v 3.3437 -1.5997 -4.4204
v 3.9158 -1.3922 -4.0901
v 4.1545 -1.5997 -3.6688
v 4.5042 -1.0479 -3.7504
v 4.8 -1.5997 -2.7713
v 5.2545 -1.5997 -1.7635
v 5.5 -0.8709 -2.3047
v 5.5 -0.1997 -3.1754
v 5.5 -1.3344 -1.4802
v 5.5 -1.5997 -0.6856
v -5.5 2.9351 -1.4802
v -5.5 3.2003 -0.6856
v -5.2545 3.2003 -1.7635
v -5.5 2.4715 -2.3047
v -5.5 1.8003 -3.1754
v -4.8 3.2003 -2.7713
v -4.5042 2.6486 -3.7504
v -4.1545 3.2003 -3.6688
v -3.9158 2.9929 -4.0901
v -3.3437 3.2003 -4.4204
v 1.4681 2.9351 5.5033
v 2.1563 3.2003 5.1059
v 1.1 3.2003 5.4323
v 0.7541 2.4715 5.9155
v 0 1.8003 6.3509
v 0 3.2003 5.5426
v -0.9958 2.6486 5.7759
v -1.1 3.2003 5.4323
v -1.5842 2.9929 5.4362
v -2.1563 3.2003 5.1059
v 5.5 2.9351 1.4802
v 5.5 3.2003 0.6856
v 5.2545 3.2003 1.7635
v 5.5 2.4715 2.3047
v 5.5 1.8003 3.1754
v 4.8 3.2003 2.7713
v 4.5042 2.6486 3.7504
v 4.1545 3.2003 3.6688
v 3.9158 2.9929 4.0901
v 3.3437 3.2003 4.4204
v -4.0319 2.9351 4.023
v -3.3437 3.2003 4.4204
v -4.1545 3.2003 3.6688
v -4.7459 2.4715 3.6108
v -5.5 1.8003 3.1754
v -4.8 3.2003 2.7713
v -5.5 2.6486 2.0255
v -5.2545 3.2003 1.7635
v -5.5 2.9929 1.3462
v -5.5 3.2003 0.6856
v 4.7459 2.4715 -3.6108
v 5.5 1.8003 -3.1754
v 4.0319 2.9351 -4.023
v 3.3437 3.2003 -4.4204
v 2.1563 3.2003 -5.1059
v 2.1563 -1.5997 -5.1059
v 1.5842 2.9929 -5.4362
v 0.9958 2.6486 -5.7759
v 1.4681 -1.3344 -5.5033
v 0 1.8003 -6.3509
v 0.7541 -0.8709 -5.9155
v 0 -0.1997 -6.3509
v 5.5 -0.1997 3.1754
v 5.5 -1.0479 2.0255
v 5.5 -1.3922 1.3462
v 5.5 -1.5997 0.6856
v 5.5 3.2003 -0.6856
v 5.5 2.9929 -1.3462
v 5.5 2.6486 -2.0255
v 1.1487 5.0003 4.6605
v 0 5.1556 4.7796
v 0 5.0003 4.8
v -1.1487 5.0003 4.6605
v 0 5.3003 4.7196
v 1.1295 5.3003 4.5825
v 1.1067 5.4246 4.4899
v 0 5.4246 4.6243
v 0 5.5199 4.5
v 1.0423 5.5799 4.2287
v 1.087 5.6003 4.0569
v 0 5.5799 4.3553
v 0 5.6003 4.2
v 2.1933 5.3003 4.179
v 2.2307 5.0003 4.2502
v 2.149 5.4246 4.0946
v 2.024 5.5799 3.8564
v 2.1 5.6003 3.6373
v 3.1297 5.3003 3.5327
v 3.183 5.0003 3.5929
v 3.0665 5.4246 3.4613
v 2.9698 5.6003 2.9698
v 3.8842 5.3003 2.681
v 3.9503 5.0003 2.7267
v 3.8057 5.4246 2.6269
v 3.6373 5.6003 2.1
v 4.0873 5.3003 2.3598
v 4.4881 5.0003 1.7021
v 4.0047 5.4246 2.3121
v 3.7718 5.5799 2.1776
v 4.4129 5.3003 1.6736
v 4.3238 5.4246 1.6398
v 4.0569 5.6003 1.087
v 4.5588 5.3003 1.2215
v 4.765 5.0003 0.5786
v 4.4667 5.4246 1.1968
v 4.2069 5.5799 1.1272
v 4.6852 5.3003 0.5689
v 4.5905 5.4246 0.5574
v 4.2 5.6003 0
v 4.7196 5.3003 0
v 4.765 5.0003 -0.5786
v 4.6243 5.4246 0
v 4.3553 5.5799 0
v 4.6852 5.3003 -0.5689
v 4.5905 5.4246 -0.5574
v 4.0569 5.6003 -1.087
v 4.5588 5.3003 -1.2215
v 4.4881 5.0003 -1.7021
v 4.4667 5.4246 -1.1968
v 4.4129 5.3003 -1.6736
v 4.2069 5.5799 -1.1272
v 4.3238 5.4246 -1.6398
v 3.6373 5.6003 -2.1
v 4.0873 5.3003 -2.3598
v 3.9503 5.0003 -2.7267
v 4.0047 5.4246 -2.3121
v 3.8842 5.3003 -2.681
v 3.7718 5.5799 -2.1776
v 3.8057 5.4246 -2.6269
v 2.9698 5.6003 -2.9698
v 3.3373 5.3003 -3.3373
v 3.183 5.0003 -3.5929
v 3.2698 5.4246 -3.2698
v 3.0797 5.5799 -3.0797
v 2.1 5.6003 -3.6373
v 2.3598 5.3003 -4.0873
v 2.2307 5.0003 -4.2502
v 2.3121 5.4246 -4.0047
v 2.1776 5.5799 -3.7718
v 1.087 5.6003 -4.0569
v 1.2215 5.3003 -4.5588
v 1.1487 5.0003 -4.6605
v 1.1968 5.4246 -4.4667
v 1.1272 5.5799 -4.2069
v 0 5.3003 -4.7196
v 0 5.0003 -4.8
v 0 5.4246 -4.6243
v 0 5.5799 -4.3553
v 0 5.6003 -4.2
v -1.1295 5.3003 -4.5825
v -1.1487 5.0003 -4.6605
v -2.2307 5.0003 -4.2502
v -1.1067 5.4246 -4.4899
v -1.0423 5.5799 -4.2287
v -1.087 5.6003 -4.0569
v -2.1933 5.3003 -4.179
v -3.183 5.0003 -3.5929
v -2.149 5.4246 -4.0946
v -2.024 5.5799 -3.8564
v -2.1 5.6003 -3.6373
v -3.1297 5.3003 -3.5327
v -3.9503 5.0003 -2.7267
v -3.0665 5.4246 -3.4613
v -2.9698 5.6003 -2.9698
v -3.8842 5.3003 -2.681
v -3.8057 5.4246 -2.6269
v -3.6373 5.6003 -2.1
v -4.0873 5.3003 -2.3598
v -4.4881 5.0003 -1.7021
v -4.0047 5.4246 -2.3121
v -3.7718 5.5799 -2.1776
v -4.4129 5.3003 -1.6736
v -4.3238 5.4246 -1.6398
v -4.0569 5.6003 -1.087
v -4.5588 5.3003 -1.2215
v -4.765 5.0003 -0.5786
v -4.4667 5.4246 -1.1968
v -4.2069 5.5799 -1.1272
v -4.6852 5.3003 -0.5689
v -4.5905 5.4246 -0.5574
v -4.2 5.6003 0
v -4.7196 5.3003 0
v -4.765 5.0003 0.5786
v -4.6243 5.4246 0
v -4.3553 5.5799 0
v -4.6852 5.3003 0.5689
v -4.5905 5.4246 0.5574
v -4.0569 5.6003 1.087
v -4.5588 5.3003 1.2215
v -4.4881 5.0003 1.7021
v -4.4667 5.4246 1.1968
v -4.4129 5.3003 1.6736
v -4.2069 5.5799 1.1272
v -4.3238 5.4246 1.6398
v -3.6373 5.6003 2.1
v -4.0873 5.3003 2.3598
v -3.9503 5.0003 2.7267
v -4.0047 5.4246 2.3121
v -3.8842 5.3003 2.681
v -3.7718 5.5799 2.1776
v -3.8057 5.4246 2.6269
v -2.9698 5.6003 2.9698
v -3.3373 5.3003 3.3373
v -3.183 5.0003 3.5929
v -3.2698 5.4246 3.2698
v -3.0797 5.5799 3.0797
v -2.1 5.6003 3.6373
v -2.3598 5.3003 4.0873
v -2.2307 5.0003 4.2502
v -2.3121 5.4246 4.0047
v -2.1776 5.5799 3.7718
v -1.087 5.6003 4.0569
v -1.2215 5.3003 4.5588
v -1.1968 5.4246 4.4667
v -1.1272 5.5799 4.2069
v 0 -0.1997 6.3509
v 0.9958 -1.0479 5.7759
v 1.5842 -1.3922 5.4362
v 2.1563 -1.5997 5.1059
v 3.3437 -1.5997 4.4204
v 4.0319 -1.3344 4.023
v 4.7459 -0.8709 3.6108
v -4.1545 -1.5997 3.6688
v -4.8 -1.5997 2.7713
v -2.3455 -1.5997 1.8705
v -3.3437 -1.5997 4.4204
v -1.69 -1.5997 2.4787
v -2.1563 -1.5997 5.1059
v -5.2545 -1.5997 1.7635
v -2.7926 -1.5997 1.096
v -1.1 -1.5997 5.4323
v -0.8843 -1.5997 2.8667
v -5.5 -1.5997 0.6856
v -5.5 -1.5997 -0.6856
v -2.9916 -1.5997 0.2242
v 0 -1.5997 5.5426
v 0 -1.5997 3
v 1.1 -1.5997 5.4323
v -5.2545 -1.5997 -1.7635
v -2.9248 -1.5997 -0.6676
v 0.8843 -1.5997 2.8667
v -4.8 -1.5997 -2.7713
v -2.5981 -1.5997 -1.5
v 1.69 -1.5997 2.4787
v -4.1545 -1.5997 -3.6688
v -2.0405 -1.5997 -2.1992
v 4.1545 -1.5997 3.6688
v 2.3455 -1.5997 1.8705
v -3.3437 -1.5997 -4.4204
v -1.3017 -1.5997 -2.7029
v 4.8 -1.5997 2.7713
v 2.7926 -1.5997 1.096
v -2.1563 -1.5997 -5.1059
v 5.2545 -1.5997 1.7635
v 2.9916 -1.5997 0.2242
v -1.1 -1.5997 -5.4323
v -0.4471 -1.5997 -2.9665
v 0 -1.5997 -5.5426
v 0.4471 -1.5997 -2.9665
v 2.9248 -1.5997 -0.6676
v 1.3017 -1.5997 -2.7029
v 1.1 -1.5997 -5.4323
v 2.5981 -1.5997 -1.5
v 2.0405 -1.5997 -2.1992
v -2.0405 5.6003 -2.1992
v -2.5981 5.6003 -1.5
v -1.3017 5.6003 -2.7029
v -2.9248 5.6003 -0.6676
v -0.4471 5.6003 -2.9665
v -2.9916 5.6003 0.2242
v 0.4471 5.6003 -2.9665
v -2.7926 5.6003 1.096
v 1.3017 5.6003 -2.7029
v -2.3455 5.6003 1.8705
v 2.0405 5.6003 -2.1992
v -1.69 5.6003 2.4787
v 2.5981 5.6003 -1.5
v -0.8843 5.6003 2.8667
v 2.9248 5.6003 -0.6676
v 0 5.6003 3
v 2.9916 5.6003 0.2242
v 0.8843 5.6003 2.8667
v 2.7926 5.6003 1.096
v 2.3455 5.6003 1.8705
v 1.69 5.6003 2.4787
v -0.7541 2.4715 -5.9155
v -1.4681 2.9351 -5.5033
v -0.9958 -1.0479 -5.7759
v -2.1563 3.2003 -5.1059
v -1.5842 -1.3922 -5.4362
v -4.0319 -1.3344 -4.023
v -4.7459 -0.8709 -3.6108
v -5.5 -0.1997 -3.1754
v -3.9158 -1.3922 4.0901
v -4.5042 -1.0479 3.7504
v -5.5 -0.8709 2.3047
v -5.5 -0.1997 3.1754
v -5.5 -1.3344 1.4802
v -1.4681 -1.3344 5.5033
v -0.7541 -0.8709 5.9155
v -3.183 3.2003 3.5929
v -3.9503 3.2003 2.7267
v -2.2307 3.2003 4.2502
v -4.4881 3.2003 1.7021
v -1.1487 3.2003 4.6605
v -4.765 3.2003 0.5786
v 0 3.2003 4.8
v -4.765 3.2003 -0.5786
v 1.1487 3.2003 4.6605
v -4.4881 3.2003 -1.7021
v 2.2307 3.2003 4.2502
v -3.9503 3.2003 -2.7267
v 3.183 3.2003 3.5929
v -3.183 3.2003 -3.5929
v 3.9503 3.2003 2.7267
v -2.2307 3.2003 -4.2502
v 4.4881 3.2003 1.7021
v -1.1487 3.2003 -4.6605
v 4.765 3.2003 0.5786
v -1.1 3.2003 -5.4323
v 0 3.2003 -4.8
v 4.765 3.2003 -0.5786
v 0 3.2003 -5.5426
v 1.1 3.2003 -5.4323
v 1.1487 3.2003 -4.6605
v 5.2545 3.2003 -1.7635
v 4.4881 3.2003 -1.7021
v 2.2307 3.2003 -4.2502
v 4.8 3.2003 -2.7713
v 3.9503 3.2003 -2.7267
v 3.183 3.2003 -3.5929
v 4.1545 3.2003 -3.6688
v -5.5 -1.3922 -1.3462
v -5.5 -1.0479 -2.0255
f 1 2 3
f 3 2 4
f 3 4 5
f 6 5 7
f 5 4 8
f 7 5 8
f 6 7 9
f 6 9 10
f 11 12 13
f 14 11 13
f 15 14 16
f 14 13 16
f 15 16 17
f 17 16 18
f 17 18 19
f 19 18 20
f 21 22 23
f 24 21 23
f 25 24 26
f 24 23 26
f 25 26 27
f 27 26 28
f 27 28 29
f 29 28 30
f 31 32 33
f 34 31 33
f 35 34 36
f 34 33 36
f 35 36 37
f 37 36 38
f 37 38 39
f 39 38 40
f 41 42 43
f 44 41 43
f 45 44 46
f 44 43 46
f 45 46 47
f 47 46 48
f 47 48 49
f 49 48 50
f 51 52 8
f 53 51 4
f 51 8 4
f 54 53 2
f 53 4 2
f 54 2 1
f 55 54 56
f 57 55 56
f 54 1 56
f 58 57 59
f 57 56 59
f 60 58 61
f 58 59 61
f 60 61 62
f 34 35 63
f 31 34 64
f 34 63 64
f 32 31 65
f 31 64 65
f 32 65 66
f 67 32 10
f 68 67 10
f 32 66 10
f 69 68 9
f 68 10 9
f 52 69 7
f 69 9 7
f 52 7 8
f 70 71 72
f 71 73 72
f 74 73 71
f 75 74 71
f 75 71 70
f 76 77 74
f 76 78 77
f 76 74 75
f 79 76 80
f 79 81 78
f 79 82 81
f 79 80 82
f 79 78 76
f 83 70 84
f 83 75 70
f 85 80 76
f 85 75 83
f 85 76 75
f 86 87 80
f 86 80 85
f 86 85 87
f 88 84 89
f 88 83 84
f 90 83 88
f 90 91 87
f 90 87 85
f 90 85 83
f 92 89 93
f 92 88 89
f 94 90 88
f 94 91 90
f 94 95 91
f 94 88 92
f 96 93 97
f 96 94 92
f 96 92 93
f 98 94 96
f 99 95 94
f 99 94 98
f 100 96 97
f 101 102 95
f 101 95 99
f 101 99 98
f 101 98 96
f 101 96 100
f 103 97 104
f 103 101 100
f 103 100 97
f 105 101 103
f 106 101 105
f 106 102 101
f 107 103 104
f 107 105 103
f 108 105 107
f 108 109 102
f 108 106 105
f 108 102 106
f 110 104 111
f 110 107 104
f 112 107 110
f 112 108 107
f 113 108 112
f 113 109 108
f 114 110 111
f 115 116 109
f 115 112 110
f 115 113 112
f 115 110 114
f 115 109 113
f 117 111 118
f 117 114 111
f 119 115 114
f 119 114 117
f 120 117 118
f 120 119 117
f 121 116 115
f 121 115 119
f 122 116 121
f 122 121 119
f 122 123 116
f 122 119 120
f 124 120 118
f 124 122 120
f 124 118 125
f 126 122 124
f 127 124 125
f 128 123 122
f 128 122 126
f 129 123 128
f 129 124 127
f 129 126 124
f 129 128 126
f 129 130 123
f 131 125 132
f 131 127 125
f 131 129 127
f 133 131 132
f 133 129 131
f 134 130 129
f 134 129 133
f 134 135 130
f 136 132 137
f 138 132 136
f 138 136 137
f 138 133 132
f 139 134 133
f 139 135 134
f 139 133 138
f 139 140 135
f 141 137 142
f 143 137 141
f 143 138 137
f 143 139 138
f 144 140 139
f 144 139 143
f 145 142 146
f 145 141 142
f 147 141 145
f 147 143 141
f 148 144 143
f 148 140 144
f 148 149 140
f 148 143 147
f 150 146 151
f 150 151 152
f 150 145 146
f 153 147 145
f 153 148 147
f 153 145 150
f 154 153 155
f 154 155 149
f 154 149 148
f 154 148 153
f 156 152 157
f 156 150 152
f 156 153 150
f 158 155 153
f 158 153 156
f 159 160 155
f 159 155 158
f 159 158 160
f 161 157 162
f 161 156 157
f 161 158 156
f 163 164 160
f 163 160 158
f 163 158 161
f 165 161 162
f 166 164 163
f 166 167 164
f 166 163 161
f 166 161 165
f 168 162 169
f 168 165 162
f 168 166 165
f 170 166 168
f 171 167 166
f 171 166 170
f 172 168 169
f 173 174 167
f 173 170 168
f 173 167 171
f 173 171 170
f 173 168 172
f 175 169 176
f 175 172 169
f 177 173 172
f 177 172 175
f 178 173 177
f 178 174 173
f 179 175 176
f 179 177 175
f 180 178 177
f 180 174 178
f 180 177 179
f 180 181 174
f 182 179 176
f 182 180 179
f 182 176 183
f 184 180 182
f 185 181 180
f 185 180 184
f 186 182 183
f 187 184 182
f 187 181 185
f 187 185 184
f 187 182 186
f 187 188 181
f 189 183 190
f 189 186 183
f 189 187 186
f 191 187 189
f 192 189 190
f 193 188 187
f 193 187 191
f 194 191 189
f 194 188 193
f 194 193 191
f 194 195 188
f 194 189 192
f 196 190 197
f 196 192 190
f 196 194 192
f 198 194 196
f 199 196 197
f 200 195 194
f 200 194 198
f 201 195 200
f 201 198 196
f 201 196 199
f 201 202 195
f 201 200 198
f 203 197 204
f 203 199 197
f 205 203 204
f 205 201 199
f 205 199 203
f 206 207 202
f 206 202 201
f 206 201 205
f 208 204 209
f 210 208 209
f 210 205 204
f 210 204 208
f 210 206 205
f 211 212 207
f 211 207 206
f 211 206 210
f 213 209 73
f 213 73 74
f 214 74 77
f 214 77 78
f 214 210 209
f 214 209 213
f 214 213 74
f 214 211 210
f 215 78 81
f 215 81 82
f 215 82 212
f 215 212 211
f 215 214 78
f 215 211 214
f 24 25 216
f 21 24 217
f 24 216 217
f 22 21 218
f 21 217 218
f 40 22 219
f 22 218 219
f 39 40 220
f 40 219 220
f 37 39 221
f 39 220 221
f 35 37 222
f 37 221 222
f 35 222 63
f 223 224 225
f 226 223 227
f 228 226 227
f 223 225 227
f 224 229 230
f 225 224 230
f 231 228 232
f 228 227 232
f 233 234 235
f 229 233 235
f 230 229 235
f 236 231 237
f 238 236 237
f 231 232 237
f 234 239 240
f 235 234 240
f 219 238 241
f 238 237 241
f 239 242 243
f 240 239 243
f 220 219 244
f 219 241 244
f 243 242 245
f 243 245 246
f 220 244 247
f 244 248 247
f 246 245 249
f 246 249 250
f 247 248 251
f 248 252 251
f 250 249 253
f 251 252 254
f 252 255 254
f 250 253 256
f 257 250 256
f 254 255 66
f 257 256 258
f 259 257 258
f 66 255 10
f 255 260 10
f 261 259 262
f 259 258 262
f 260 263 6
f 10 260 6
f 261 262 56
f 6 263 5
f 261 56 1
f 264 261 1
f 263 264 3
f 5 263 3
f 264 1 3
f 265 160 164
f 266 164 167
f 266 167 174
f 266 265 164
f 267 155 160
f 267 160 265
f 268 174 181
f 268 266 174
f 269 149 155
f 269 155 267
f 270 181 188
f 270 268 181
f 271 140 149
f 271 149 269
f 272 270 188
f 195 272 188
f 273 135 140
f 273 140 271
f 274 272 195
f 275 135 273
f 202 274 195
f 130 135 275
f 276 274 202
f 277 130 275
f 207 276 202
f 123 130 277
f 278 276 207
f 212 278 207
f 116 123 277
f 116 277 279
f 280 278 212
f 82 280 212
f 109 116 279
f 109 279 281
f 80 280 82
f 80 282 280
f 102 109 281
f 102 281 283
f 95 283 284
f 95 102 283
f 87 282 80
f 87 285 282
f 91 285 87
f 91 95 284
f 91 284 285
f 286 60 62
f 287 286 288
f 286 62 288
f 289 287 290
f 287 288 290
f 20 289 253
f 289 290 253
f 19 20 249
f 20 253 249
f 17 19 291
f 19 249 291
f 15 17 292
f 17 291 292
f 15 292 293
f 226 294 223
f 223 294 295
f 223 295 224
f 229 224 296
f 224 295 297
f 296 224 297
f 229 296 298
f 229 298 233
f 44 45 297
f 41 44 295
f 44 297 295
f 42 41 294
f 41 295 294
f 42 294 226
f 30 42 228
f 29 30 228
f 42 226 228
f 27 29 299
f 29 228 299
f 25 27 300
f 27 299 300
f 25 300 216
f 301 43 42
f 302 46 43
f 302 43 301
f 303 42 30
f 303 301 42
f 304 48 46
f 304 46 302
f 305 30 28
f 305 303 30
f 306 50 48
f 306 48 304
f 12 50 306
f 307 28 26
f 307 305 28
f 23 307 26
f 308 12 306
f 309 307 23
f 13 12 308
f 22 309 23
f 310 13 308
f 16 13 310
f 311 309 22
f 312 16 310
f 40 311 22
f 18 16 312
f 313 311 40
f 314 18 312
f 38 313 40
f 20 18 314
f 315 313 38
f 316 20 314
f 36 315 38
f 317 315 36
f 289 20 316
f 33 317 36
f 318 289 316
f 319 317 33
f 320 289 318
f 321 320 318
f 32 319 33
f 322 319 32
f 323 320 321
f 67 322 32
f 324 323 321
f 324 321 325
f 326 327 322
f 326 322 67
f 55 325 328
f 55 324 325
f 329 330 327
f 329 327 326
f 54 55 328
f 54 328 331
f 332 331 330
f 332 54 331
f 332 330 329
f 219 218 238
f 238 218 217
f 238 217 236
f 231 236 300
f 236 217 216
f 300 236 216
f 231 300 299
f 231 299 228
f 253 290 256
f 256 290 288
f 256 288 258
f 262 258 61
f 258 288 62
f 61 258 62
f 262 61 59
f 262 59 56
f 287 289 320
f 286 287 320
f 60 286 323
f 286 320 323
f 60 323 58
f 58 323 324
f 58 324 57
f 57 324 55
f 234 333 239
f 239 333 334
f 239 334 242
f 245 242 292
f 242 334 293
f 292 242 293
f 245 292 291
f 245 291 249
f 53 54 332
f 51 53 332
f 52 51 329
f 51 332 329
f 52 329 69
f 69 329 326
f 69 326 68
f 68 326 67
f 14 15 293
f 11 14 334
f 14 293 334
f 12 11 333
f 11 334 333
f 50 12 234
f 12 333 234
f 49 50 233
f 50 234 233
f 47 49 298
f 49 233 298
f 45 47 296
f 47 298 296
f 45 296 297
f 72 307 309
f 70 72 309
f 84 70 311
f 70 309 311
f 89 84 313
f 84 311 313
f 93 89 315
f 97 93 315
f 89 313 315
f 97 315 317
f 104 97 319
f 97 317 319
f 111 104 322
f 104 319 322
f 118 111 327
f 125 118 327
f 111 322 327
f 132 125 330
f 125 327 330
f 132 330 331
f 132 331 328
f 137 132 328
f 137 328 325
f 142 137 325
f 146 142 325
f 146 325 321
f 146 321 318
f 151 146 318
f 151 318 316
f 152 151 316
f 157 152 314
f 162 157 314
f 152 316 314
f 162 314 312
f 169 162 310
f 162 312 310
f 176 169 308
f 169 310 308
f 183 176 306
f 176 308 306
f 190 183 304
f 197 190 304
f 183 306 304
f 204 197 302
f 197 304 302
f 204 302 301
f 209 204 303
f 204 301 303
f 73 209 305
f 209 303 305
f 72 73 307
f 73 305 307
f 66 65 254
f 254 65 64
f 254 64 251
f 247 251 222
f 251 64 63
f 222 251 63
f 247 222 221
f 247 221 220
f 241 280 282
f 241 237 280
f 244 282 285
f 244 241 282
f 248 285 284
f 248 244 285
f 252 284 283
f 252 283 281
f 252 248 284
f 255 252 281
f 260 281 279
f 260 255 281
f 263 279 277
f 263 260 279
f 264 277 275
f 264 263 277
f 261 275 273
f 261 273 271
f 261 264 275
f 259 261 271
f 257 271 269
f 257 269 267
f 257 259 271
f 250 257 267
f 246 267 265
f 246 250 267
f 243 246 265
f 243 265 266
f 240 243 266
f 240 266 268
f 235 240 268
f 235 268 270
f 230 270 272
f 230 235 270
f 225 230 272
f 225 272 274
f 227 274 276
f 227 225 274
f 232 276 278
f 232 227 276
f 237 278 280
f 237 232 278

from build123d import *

# Parameters (mm, degrees)
SKETCH_1_R      = 1.5
EXTRUDE_1_DEPTH = 2.4
SKETCH_4_R      = 2.4
SKETCH_4_R_2    = 1.5
EXTRUDE_3_DEPTH = 1.2
FILLET_5_R      = 0.3
SCALE_1_SCALE   = 2


with BuildPart() as part:
    # 草图1 → 凸台-拉伸1 (new body)
    with BuildSketch(Plane(origin=(0, 0, 0), x_dir=(1, 0, 0), z_dir=(0, 1, 0))):
        Polygon((0, 3.175426481), (-2.75, 1.58771324), (-2.75, -1.58771324), (0, -3.175426481), (2.75, -1.58771324), (2.75, 1.58771324), align=None)
        with Locations(Location((0, 0, 0), (0, 0, 270))):
            Circle(SKETCH_1_R, mode=Mode.SUBTRACT)
    extrude(amount=EXTRUDE_1_DEPTH)

    # 草图3 → 切除-旋转7 (revolve, cut)
    with BuildSketch(Plane(origin=(0, 0, 0), x_dir=(0, 0, -1), z_dir=(1, 0, 0))):
        Polygon((0.384303775, 7.2), (4.083483307, 7.2), (4.083483307, -4.8), (0.297701235, -4.8), (0.297701235, -4.284366336), (3.464101615, 1.2), (0.384303775, 6.534366336), align=None)
    revolve(axis=Axis((0, 2.4, 0), (0, -1, 0)), mode=Mode.SUBTRACT)

    # 草图4 → 凸台-拉伸3 (add)
    with BuildSketch(Plane(origin=(0, 2.4, 0), x_dir=(1, 0, 0), z_dir=(0, 1, 0))):
        with Locations(Location((0, 0, 0), (0, 0, 270))):
            Circle(SKETCH_4_R)
        with Locations(Location((0, 0, 0), (0, 0, 270))):
            Circle(SKETCH_4_R_2, mode=Mode.SUBTRACT)
    extrude(amount=EXTRUDE_3_DEPTH)

    # 圆角5
    fillet_5_edges = [part.edges().sort_by_distance(p)[0] for p in [
        (0, 3.6, -2.4),
    ]]
    fillet(fillet_5_edges, radius=FILLET_5_R)


with BuildPart() as part_1:
    # 缩放比例1: scaled about (0, 1.599672866, 1e-09)
    add(part.part.scale(SCALE_1_SCALE).moved(Location((0, -1.599672866, -1e-09))))


solid = part_1.part
